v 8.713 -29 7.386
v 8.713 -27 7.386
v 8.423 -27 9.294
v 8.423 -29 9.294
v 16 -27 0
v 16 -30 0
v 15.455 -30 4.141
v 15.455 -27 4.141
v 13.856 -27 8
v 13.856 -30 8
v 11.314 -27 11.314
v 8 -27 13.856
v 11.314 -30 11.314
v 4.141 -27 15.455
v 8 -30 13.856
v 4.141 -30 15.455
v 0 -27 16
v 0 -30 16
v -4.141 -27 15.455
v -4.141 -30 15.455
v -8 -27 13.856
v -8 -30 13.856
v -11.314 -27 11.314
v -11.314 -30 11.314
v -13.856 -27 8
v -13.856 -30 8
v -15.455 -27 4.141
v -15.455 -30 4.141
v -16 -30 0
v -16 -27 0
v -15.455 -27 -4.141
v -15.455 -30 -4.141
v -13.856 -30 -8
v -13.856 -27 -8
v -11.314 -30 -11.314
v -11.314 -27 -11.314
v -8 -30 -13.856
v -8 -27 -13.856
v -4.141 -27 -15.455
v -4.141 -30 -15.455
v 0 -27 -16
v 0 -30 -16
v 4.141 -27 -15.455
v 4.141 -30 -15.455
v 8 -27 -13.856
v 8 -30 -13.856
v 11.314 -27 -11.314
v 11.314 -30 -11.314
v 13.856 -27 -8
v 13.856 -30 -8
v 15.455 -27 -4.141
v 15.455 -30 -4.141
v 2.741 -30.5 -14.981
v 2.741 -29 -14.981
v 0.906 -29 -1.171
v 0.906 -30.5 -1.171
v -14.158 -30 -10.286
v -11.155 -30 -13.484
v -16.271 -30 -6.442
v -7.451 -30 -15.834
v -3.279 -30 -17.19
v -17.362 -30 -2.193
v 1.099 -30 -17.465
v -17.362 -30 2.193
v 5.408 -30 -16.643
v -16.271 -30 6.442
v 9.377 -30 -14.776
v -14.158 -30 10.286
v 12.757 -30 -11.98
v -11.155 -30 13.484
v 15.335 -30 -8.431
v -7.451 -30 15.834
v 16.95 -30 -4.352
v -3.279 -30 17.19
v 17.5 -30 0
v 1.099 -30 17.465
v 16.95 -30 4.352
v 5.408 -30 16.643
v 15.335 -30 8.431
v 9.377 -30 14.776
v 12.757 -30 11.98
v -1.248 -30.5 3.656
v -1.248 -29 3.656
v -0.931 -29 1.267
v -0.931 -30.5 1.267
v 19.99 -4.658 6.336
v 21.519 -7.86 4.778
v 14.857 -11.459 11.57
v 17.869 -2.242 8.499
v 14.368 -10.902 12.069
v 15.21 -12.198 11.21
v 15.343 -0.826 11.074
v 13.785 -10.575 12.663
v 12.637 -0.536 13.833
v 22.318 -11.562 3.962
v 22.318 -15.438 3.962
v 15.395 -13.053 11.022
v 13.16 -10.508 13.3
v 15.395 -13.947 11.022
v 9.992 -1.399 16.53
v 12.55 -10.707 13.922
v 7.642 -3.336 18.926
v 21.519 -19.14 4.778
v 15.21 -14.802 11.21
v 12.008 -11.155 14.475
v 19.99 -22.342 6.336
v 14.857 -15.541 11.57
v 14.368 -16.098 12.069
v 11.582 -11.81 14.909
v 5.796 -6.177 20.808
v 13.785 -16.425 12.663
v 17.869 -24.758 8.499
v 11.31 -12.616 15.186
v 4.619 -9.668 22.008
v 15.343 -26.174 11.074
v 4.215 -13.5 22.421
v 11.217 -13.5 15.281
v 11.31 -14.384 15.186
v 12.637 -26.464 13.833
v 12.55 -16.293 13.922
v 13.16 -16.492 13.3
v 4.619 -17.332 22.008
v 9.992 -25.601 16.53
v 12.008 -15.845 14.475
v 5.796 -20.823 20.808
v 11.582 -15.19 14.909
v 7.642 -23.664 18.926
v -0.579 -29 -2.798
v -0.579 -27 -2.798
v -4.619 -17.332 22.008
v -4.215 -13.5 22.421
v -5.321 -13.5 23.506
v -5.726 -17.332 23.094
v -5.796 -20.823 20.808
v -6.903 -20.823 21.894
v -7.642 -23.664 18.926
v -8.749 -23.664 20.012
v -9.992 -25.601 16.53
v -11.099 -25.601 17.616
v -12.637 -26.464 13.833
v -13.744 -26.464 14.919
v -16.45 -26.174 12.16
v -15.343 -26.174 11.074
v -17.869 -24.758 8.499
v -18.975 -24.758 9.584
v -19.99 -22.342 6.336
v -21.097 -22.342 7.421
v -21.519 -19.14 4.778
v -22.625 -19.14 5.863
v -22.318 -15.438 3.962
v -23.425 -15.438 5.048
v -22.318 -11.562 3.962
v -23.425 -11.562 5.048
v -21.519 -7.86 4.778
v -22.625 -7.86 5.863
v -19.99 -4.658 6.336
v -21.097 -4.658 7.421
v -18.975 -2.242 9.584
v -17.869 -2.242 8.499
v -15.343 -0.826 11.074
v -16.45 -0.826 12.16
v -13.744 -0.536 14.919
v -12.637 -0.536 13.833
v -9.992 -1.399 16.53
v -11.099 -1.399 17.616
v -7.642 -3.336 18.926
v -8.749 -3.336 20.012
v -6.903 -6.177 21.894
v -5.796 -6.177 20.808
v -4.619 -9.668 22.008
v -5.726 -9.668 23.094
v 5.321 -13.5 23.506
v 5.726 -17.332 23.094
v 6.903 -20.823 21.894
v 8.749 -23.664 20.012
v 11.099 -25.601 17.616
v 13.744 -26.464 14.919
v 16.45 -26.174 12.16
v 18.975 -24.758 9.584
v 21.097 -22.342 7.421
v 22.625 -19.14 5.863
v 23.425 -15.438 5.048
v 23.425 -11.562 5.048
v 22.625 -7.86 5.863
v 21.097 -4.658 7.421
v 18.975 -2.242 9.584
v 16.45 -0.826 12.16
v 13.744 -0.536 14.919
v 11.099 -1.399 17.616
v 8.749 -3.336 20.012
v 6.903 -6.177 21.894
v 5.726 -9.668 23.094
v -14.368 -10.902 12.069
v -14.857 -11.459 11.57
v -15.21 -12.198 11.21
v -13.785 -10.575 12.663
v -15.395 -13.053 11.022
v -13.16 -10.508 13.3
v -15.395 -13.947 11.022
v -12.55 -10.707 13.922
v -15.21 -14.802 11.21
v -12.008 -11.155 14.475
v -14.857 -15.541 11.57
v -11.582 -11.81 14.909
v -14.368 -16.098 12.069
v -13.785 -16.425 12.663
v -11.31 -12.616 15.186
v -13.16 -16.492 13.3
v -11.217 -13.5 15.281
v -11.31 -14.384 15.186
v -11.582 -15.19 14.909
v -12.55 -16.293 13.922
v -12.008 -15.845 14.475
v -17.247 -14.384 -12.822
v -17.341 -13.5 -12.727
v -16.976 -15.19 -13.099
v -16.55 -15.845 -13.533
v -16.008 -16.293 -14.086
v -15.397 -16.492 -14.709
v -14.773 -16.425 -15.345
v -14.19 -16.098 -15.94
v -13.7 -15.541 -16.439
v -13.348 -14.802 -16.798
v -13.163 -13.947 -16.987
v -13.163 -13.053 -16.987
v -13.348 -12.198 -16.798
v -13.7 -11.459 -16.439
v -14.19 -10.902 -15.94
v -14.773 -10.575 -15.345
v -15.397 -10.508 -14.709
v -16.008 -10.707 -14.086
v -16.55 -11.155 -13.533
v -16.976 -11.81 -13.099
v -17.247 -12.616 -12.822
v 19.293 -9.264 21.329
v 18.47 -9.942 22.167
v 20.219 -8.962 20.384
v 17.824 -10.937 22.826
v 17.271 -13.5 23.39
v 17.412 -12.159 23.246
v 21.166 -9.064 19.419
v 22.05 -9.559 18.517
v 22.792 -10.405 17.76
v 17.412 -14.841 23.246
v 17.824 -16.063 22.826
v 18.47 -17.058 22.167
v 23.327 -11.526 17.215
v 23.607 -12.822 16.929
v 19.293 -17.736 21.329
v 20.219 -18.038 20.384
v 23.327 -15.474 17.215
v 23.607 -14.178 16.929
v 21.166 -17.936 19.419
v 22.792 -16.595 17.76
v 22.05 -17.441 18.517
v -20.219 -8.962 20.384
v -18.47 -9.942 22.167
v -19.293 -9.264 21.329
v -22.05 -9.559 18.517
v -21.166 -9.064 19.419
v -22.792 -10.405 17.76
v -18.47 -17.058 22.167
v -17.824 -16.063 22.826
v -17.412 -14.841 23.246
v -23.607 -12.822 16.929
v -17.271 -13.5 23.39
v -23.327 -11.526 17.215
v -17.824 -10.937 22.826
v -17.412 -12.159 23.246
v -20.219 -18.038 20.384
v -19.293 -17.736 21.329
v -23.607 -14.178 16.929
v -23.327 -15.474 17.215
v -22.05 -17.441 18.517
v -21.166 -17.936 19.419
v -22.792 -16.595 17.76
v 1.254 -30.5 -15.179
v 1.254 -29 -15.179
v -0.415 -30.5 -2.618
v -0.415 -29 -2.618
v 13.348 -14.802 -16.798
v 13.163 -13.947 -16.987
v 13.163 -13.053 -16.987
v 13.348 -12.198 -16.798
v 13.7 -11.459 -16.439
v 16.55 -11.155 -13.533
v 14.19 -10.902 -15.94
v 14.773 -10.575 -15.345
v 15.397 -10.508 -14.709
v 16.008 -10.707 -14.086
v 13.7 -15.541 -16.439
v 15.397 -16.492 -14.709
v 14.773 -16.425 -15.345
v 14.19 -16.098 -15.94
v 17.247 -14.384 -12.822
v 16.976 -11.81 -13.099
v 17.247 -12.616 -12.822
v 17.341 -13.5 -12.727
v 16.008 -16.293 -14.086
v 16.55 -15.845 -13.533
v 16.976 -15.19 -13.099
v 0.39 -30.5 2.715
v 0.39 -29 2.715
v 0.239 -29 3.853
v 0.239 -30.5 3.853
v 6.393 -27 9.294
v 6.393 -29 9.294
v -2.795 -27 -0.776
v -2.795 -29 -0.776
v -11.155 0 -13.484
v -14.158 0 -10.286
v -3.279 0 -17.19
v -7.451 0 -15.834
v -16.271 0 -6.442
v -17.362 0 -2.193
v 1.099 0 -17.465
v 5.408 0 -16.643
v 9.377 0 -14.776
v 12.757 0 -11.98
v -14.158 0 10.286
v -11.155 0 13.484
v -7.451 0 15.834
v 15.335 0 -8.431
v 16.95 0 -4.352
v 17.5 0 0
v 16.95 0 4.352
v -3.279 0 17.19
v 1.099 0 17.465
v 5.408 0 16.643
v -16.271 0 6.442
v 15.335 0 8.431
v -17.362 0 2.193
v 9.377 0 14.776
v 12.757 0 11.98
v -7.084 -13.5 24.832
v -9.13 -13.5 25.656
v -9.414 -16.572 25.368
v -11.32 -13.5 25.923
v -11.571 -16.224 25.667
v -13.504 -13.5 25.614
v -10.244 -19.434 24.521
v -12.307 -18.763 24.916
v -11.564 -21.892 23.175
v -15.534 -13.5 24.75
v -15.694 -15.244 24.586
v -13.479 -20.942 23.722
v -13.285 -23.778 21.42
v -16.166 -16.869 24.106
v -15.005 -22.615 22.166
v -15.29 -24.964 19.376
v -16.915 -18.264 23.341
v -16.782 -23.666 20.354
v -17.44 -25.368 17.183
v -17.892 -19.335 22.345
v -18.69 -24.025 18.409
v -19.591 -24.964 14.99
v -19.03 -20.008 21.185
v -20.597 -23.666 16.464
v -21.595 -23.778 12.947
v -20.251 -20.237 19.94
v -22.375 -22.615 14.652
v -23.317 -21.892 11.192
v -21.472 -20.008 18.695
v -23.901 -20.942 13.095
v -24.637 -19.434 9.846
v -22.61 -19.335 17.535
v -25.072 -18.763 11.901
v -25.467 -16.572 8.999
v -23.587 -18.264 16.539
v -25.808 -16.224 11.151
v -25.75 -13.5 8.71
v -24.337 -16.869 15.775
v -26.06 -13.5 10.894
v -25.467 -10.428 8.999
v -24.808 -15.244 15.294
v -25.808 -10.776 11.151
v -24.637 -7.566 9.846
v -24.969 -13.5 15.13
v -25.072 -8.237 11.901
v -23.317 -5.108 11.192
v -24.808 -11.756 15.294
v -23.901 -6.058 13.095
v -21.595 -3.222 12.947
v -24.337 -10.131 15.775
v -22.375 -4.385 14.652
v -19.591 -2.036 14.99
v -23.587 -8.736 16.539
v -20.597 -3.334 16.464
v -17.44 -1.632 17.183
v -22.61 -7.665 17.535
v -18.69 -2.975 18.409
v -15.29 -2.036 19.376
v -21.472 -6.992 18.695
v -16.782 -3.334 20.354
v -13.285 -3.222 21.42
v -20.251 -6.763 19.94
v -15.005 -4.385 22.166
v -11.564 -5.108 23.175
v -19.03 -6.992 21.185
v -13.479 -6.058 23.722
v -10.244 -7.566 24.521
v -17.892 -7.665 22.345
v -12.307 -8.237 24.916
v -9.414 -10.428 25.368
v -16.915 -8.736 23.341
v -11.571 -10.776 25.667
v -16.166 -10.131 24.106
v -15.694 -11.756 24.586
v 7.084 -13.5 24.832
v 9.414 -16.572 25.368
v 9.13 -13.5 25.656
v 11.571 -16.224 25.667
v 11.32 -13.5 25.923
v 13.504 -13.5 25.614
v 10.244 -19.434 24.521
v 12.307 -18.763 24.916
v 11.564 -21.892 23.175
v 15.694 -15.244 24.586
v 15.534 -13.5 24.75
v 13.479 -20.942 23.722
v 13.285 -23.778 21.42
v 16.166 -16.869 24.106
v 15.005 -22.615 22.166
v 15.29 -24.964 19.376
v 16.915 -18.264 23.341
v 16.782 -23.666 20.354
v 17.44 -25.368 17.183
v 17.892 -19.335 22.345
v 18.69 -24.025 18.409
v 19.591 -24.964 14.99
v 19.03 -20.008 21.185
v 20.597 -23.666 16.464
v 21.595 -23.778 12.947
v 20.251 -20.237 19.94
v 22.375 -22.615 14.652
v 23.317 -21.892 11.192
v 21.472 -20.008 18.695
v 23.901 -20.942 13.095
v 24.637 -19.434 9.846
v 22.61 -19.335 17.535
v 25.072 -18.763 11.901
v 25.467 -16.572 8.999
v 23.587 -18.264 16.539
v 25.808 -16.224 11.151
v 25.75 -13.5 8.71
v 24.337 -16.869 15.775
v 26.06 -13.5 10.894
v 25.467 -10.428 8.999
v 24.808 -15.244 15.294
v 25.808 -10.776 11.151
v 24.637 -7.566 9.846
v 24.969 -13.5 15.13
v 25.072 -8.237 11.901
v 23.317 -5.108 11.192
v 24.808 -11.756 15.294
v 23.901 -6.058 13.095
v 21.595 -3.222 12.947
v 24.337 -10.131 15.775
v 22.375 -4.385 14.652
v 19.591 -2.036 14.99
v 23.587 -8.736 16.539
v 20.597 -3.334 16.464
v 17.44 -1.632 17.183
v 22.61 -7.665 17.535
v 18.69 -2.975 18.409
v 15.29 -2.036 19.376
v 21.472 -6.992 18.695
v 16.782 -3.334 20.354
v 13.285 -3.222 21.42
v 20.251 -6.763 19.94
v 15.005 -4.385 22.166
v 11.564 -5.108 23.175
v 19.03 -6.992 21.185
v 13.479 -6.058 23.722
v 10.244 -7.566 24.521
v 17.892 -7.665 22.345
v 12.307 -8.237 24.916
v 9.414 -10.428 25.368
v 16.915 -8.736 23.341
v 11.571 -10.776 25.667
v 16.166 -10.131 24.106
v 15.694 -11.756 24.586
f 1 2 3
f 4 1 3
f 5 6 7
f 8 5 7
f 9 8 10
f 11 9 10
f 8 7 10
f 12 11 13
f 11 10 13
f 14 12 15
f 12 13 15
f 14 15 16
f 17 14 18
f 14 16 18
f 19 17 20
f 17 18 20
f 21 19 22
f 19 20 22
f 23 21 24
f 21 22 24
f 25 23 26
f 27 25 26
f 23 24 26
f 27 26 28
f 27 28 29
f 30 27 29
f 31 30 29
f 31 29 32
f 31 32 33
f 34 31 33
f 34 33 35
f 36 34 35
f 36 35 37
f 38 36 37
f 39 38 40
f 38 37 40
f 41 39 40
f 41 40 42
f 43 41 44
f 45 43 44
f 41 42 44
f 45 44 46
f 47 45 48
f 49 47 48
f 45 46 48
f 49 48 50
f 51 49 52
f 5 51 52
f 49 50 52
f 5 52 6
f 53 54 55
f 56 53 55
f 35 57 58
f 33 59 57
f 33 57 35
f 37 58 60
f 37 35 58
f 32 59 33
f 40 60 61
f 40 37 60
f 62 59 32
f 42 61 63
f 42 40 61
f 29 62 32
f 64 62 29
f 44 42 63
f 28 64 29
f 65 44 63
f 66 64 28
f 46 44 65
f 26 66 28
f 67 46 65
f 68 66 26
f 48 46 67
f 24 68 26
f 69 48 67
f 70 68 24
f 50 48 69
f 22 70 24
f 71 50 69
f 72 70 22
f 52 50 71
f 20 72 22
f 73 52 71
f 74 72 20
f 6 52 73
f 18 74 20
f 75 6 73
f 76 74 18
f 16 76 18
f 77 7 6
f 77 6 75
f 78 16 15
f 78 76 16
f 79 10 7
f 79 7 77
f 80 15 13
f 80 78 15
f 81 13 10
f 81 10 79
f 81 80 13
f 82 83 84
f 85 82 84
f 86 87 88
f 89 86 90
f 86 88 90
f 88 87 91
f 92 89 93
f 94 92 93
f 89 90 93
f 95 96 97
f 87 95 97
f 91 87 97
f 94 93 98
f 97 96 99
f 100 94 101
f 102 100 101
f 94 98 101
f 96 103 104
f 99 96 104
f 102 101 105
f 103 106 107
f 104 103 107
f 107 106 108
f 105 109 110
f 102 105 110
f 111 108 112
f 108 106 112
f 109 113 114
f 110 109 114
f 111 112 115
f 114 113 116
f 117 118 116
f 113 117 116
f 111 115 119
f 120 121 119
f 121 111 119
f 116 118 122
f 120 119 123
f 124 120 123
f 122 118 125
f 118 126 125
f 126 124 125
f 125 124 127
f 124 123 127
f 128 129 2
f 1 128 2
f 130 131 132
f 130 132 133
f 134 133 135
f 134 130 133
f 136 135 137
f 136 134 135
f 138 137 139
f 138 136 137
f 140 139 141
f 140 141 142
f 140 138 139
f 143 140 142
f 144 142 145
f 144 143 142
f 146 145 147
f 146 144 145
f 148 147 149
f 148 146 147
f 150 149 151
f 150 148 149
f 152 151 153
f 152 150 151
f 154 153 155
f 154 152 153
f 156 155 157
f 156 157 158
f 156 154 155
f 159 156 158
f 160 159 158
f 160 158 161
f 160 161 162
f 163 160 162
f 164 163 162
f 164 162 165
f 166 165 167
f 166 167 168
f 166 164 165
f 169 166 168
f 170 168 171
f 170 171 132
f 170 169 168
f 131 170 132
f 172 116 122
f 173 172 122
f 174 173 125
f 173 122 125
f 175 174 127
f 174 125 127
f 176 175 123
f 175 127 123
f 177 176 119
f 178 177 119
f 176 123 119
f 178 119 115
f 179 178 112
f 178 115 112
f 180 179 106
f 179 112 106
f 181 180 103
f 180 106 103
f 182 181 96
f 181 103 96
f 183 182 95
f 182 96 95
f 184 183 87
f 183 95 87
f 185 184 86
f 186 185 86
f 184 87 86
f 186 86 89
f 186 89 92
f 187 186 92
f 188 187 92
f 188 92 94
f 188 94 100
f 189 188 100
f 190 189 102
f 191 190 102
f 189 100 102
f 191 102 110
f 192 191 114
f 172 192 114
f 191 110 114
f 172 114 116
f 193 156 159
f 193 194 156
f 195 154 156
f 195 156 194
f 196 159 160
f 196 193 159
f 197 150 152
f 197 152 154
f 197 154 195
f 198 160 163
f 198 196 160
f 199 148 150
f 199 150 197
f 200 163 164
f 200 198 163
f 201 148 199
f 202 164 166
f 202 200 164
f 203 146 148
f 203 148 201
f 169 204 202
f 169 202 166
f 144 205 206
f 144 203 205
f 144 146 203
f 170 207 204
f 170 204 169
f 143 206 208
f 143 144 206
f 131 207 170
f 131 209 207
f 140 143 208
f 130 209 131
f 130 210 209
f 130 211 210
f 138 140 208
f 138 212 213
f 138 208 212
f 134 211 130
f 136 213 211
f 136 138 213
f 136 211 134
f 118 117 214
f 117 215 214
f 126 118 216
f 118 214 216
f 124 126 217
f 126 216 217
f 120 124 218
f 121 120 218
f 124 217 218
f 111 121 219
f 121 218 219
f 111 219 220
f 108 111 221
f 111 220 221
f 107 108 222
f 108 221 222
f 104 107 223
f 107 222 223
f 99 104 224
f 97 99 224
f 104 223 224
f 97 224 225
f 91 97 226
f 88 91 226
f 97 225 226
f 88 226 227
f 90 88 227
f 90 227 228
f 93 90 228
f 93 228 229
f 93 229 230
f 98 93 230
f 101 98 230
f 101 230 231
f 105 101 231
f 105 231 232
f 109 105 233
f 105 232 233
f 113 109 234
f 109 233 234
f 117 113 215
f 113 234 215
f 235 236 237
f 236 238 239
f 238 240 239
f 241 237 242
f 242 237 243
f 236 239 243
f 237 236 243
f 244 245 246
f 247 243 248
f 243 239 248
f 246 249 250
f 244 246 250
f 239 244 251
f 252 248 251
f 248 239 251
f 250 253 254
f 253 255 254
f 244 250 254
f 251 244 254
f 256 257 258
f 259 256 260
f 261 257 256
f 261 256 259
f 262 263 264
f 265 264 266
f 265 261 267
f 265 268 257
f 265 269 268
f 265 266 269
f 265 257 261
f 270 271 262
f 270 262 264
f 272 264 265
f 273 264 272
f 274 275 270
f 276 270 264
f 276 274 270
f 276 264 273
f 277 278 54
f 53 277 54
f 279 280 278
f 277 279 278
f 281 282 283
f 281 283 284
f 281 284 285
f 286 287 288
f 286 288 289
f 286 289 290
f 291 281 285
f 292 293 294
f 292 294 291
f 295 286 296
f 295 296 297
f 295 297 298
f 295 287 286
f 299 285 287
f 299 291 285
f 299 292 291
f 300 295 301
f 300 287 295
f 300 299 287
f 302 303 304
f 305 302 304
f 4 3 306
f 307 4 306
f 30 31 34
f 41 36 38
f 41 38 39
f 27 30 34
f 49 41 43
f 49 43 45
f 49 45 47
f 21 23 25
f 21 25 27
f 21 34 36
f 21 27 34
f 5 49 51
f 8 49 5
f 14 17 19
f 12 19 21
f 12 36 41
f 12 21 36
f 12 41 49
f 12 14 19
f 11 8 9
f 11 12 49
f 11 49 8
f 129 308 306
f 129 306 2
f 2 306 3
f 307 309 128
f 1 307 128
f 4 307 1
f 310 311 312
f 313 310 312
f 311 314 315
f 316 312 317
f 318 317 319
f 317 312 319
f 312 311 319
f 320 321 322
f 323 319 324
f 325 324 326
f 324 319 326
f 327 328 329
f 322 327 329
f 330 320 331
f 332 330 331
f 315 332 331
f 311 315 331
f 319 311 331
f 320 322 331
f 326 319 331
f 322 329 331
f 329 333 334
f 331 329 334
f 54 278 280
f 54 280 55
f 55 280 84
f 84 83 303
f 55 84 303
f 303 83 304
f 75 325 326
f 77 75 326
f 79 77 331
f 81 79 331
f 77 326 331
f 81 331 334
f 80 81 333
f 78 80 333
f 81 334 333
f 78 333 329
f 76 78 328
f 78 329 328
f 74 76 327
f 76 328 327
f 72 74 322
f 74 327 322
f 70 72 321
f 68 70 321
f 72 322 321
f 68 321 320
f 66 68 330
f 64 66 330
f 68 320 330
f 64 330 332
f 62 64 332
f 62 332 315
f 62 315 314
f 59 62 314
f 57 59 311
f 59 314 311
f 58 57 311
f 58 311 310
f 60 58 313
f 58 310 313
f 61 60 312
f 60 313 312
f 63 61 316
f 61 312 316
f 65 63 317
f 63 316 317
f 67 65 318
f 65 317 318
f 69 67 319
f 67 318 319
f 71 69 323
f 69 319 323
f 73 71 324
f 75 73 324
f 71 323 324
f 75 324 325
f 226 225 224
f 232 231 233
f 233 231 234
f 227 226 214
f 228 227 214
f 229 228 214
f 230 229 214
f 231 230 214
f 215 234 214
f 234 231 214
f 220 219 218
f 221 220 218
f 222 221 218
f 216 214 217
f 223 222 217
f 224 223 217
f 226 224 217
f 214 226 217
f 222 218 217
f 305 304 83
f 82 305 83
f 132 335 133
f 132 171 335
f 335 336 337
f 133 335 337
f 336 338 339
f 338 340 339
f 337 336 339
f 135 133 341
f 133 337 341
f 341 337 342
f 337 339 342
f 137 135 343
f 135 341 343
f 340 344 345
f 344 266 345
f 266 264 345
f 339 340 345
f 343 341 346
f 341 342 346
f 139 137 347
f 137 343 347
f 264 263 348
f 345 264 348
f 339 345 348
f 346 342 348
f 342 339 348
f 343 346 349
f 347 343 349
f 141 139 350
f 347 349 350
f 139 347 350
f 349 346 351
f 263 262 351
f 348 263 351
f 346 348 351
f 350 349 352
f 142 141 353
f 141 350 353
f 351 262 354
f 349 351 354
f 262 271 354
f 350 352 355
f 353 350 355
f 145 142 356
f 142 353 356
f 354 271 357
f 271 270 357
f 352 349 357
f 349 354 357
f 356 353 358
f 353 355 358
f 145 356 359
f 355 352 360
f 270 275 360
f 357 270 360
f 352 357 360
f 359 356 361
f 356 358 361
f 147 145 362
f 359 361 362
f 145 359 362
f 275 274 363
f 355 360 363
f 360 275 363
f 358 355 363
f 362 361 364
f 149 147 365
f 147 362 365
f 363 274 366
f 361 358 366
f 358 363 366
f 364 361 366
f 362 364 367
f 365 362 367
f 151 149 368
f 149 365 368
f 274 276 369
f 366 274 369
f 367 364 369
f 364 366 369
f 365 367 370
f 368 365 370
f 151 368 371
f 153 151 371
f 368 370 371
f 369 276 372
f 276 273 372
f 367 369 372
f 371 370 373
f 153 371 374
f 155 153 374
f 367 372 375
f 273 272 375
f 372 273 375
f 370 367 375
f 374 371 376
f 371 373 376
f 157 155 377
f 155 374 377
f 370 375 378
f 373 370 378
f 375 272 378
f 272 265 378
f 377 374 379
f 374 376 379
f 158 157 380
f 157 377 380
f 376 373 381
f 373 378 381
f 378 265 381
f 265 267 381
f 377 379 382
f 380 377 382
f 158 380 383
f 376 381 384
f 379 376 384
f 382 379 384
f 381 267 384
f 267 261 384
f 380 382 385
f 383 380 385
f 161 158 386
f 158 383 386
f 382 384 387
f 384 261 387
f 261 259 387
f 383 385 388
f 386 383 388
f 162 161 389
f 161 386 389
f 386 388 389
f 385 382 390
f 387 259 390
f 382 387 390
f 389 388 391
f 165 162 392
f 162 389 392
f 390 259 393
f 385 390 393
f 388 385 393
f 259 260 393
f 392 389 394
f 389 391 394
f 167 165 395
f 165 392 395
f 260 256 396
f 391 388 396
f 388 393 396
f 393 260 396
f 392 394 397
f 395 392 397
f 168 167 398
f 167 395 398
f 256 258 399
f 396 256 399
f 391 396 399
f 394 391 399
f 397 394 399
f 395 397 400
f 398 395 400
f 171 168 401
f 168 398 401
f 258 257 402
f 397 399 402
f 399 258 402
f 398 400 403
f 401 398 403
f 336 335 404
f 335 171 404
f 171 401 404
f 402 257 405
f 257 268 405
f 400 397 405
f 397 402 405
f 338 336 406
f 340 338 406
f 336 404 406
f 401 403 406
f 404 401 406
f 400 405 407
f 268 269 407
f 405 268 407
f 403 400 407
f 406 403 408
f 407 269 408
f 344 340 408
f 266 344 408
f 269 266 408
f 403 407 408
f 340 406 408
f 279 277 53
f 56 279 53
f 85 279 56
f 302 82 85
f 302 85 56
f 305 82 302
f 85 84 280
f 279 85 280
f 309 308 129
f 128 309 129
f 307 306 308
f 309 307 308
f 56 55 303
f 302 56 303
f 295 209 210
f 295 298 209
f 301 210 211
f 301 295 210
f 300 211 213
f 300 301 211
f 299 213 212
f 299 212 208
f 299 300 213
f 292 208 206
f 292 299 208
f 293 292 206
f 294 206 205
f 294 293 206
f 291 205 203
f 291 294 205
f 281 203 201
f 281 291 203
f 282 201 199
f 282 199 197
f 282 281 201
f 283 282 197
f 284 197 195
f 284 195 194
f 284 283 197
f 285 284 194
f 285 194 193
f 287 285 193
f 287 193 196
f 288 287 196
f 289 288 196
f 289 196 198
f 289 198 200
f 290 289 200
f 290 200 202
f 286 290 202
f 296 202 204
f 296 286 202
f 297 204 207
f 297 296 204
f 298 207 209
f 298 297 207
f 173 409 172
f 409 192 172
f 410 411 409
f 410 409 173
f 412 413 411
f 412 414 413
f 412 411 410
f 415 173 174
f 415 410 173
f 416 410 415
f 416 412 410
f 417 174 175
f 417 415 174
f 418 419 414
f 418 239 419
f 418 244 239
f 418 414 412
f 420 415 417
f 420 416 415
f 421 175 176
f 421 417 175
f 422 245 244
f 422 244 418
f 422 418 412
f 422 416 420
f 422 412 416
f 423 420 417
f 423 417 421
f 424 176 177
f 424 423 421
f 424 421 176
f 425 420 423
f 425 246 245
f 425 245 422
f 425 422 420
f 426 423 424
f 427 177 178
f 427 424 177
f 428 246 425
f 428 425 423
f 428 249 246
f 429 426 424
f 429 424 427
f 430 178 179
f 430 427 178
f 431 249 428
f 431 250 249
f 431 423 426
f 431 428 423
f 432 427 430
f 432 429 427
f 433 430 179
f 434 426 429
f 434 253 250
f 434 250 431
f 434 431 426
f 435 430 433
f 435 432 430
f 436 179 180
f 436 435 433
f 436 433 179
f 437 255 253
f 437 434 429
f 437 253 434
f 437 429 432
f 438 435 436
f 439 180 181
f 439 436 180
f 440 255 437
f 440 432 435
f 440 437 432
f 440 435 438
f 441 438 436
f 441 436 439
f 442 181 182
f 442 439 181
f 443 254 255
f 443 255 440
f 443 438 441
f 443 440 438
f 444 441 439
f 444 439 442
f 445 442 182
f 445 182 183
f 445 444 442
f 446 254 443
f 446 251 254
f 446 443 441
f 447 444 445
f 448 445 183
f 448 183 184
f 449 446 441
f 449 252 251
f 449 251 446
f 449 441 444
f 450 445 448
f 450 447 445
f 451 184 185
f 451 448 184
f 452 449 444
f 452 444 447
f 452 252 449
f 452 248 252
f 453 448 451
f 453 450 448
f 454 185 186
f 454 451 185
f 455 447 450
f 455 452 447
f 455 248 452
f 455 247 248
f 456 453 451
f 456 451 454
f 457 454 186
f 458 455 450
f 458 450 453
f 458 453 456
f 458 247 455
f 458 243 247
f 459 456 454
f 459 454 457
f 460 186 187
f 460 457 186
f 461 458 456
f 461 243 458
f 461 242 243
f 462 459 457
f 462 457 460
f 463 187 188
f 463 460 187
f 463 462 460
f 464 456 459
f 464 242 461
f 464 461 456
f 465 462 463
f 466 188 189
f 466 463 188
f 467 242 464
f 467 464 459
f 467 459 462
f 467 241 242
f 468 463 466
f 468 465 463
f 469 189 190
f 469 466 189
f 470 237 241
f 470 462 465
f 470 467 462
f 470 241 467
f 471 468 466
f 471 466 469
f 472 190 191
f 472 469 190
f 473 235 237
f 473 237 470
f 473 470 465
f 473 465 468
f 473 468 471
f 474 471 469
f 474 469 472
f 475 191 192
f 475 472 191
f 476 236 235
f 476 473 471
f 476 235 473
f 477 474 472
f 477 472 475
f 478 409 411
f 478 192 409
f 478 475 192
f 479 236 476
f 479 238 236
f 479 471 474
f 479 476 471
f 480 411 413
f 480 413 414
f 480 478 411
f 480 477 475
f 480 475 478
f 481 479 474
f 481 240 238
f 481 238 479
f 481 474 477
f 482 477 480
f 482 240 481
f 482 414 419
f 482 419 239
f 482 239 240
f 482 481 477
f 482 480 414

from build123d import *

# Parameters (mm, degrees)
F0_R      = 17.5
F1_DEPTH  = 30
F2_R      = 16
F3_DEPTH  = 3
F7_R      = 8.4497474683
F10_DEPTH = 2
F12_DEPTH = 1.5


with BuildPart() as f1:
    # F0 (on Front) → F1 (new body)
    with BuildSketch(Plane.XZ):
        Circle(F0_R)
    extrude(amount=F1_DEPTH)

    # F2 (on face) → F3 (cut)
    with BuildSketch(Plane.XZ.offset(30)):
        Circle(F2_R)
    extrude(amount=-F3_DEPTH, mode=Mode.SUBTRACT)


with BuildPart() as f6:
    # F5 (on mid) → F6 (revolve)
    with BuildSketch(Plane(origin=(0, -13.5, 0), x_dir=(-1, 0, 0), z_dir=(0, 1, 0))):
        Polygon((11.2167216087, 15.2814061035), (18.3561041689, 22.2834926967), (11.3540175757, 29.4228752569), (4.2146350155, 22.4207886637), align=None)
        Polygon((-15.2401826543, -14.8687550374), (20.4567301469, 20.1416779286), (18.3561041689, 22.2834926967), (11.2167216087, 15.2814061035), (-17.3408086323, -12.7269402693), align=None)
    revolve(axis=Axis((-2.6082737463, -13.5, 2.6364614456), (0.713938256, 0, -0.7002086593)))

    # F7
    f7_edges = [f6.edges().sort_by_distance(p)[0] for p in [
        (-29.559443, -13.5, 10.860481),
    ]]
    fillet(f7_edges, radius=F7_R)


with BuildPart() as f8_1:
    # F8: instance of F6
    add(f6.part.mirror(Plane.YZ))


with BuildPart() as f10:
    # F9 (on face) → F10 (new body)
    with BuildSketch(Plane.XZ.offset(27)):
        Polygon((6.3925895488, 9.2935226517), (-2.7951505678, -0.7762410672), (-0.5789937455, -2.7982818528), (8.7133899779, 7.3861712654), (8.4231317715, 9.2935226517), align=None)
    extrude(amount=F10_DEPTH)


with BuildPart() as f12:
    # F11 (on face) → F12 (new body)
    with BuildSketch(Plane.XZ.offset(29)):
        Polygon((0.9061819389, -1.1705292136), (-0.4146567124, -2.6181684547), (1.2542340306, -15.1787668308), (2.7411665382, -14.9812023658), align=None)
        Polygon((0.2386833157, 3.8532760639), (-1.2482491919, 3.655711599), (-0.9308694085, 1.2670111952), (0.3899692428, 2.7146504363), align=None)
        Polygon((0.3899692428, 2.7146504363), (-0.9308694085, 1.2670111952), (-0.4146567124, -2.6181684547), (0.9061819389, -1.1705292136), align=None)
    extrude(amount=F12_DEPTH)


solid = Compound([f1.part, f6.part, f8_1.part, f10.part, f12.part])
